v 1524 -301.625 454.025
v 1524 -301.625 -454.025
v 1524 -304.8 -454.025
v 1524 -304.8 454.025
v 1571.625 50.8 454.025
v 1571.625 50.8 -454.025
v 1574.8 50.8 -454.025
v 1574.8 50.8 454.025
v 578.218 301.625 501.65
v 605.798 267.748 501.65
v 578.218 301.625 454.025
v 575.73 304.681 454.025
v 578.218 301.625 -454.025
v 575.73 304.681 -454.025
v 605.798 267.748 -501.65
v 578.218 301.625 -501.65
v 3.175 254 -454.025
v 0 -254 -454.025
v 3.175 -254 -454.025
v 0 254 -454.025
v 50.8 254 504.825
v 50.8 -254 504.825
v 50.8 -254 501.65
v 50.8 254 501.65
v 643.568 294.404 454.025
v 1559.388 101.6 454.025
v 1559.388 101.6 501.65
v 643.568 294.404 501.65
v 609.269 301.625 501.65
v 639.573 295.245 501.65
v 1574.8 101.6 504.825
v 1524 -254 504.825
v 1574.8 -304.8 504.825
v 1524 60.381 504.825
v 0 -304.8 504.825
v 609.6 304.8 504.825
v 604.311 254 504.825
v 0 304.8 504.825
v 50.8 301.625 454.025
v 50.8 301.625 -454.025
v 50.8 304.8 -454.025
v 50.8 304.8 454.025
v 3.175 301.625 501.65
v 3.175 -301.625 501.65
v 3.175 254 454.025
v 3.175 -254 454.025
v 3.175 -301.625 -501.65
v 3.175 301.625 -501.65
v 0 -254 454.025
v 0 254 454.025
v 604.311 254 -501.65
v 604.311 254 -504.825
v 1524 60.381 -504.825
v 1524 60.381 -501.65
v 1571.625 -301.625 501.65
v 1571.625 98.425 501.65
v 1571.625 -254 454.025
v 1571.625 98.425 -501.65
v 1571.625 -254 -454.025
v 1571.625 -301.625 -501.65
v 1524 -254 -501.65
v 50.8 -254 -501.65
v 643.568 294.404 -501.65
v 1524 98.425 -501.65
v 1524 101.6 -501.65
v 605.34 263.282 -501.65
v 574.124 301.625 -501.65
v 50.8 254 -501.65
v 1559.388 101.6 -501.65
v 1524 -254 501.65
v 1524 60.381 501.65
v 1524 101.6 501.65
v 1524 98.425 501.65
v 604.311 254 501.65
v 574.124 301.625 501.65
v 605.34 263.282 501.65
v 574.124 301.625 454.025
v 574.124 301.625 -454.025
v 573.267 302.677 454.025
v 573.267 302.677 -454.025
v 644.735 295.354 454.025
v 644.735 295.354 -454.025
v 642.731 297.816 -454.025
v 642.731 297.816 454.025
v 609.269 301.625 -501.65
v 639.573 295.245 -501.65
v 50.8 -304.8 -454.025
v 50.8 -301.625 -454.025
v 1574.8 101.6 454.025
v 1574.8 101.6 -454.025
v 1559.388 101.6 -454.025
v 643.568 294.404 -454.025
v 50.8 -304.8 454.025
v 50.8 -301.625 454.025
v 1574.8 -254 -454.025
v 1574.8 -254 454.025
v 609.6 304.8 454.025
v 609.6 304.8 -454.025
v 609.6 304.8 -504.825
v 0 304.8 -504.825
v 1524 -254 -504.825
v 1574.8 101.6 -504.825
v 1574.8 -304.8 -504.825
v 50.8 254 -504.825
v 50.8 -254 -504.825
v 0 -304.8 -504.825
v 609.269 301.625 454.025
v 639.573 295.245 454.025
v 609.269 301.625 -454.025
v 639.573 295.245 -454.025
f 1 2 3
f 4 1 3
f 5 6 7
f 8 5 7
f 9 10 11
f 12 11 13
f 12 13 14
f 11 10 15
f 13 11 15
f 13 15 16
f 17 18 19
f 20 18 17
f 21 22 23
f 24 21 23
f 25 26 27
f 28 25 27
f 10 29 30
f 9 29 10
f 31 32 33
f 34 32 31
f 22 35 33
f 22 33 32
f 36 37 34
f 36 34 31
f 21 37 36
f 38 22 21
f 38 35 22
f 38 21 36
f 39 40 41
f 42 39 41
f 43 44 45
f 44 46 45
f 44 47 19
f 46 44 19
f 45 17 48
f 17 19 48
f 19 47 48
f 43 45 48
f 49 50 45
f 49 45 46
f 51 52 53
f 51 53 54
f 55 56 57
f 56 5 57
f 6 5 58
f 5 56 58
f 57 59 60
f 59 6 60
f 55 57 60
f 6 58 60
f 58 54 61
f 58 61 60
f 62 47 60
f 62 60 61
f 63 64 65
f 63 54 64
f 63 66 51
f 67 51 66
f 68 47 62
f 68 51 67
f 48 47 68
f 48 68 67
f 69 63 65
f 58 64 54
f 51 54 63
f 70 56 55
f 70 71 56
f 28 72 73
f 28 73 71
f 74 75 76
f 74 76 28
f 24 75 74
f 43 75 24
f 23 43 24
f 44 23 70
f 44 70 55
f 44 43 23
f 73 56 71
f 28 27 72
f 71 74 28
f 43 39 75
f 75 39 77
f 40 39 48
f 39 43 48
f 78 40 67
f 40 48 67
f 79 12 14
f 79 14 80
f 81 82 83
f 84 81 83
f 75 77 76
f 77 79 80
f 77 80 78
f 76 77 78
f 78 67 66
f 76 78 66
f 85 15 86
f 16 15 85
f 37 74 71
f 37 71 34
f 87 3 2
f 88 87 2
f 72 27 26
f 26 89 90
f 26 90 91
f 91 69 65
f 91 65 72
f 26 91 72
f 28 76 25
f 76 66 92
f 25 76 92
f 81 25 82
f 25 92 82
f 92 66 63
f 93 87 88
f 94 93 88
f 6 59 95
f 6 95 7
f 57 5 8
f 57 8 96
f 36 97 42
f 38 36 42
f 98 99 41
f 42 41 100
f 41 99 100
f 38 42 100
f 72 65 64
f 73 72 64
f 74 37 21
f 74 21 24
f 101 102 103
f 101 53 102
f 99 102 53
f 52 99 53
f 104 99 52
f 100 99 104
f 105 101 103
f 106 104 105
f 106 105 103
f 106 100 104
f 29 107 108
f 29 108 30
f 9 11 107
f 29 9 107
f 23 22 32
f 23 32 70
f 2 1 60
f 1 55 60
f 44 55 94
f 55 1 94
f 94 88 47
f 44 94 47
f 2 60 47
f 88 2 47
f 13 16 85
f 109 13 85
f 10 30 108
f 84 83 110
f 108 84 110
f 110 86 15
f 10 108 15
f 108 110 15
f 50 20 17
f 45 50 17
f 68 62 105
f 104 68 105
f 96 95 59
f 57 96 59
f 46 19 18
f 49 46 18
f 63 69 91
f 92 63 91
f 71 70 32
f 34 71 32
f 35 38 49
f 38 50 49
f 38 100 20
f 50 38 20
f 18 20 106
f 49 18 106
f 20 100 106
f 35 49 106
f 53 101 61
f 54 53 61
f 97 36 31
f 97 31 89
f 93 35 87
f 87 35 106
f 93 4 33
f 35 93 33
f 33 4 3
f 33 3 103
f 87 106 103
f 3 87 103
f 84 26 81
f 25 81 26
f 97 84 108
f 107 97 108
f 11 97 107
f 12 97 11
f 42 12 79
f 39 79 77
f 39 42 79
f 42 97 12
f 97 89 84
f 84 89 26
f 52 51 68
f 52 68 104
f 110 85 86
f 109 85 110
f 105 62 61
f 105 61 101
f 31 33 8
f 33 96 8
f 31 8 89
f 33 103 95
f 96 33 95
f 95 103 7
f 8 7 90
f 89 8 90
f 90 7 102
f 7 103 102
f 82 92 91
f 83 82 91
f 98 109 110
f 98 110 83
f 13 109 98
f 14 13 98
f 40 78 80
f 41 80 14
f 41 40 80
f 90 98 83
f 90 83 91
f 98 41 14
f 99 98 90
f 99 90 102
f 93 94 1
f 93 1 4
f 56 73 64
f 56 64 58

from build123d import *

# Parameters (mm, degrees)
BOTTOM_HORIZONTAL_ANGLE_DEPTH   = 1574.8
BOTTOM_HORIZONTAL_ANGLE_2_DEPTH = 1574.8
FRONT_VERTIAL_ANGLE_DEPTH       = 406.4
REAR_VERTICAL_ANGLE_DEPTH       = 609.6
REAR_TOP_HORIZONTAL_ANGLE_DEPTH = 609.6
BOSS_EXTRUDE5_DEPTH             = 986.357582
BOSS_EXTRUDE6_REACH             = 1011.65


with BuildPart() as part:
    # Sketch5 → Bottom Horizontal Angle (new body)
    with BuildSketch(Plane(origin=(0, 0, 0), x_dir=(0, 0, -1), z_dir=(1, 0, 0))):
        Polygon((-504.825, -304.8), (-504.825, -254), (-501.65, -254), (-501.65, -301.625), (-454.025, -301.625), (-454.025, -304.8), align=None)
    extrude(amount=BOTTOM_HORIZONTAL_ANGLE_DEPTH)



with BuildPart() as body_2:
    # Sketch5 → Bottom Horizontal Angle 2 (new body)
    with BuildSketch(Plane(origin=(0, 0, 0), x_dir=(0, 0, -1), z_dir=(1, 0, 0))):
        Polygon((501.65, -254), (504.825, -254), (504.825, -304.8), (454.025, -304.8), (454.025, -301.625), (501.65, -301.625), align=None)
    extrude(amount=BOTTOM_HORIZONTAL_ANGLE_2_DEPTH)


with BuildPart() as part_1:
    add(part.part)

    add(body_2.part)  # Front Vertial Angle merges body 2
    # Sketch6 → Front Vertial Angle (add)
    with BuildSketch(Plane.XZ.offset(304.8)):
        Polygon((1574.8, -504.825), (1524, -504.825), (1524, -501.65), (1571.625, -501.65), (1571.625, -454.025), (1574.8, -454.025), align=None)
        Polygon((1524, 501.65), (1524, 504.825), (1574.8, 504.825), (1574.8, 454.025), (1571.625, 454.025), (1571.625, 501.65), align=None)
    extrude(amount=-FRONT_VERTIAL_ANGLE_DEPTH)

    # Sketch7 → Rear Vertical Angle (add)
    with BuildSketch(Plane.XZ.offset(304.8)):
        Polygon((0, 504.825), (50.8, 504.825), (50.8, 501.65), (3.175, 501.65), (3.175, 454.025), (0, 454.025), align=None)
        Polygon((50.8, -501.65), (50.8, -504.825), (0, -504.825), (0, -454.025), (3.175, -454.025), (3.175, -501.65), align=None)
    extrude(amount=-REAR_VERTICAL_ANGLE_DEPTH)

    # Sketch8 → Rear Top Horizontal Angle (add)
    with BuildSketch(Plane.ZY):
        Polygon((504.825, 304.8), (504.825, 254), (501.65, 254), (501.65, 301.625), (454.025, 301.625), (454.025, 304.8), align=None)
        Polygon((-501.65, 254), (-504.825, 254), (-504.825, 304.8), (-454.025, 304.8), (-454.025, 301.625), (-501.65, 301.625), align=None)
    extrude(amount=-REAR_TOP_HORIZONTAL_ANGLE_DEPTH)

    # Sketch10 → Boss-Extrude5 (add)
    with BuildSketch(Plane(origin=(522.283289125, -109.954376658, 0), x_dir=(0, 0, -1), z_dir=(0.978549785, -0.206010481, 0))):
        Polygon((504.825, 423.845963712), (504.825, 373.045963712), (501.65, 373.045963712), (501.65, 420.670963712), (454.025, 420.670963712), (454.025, 423.845963712), align=None)
        Polygon((-501.65, 373.045963712), (-504.825, 373.045963712), (-504.825, 423.845963712), (-454.025, 423.845963712), (-454.025, 420.670963712), (-501.65, 420.670963712), align=None)
    extrude(amount=BOSS_EXTRUDE5_DEPTH)

    # Sketch11 → Boss-Extrude6 (add, up to next)
    with BuildSketch(Plane(origin=(0, 0, -504.825), x_dir=(-1, 0, 0), z_dir=(0, 0, -1)), mode=Mode.PRIVATE) as boss_extrude6_sk1:
        Polygon((-1574.8, 101.6), (-1524, 101.6), (-1524, 98.425), (-1571.625, 98.425), (-1571.625, 50.8), (-1574.8, 50.8), align=None)
    boss_extrude6_tool1 = extrude(boss_extrude6_sk1.sketch, amount=-BOSS_EXTRUDE6_REACH, mode=Mode.PRIVATE) - part_1.part
    add(boss_extrude6_tool1.solids().sort_by_distance((1549.4, 100.88158, -504.825))[0])
    # Sketch11 → Boss-Extrude6 (add, up to next)
    with BuildSketch(Plane(origin=(0, 0, -504.825), x_dir=(-1, 0, 0), z_dir=(0, 0, -1)), mode=Mode.PRIVATE) as boss_extrude6_sk2:
        Polygon((-1524, -301.625), (-1524, -304.8), (-1574.8, -304.8), (-1574.8, -254), (-1571.625, -254), (-1571.625, -301.625), align=None)
    boss_extrude6_tool2 = extrude(boss_extrude6_sk2.sketch, amount=-BOSS_EXTRUDE6_REACH, mode=Mode.PRIVATE) - part_1.part
    add(boss_extrude6_tool2.solids().sort_by_distance((1524.71842, -303.2125, -504.825))[0])
    # Sketch11 → Boss-Extrude6 (add, up to next)
    with BuildSketch(Plane(origin=(0, 0, -504.825), x_dir=(-1, 0, 0), z_dir=(0, 0, -1)), mode=Mode.PRIVATE) as boss_extrude6_sk3:
        Polygon((0, -304.8), (-50.8, -304.8), (-50.8, -301.625), (-3.175, -301.625), (-3.175, -254), (0, -254), align=None)
    boss_extrude6_tool3 = extrude(boss_extrude6_sk3.sketch, amount=-BOSS_EXTRUDE6_REACH, mode=Mode.PRIVATE) - part_1.part
    add(boss_extrude6_tool3.solids().sort_by_distance((25.4, -304.08158, -504.825))[0])
    # Sketch11 → Boss-Extrude6 (add, up to next)
    with BuildSketch(Plane(origin=(0, 0, -504.825), x_dir=(-1, 0, 0), z_dir=(0, 0, -1)), mode=Mode.PRIVATE) as boss_extrude6_sk4:
        Polygon((-3.175, 301.625), (-50.8, 301.625), (-50.8, 304.8), (0, 304.8), (0, 254), (-3.175, 254), align=None)
    boss_extrude6_tool4 = extrude(boss_extrude6_sk4.sketch, amount=-BOSS_EXTRUDE6_REACH, mode=Mode.PRIVATE) - part_1.part
    add(boss_extrude6_tool4.solids().sort_by_distance((26.9875, 302.34342, -504.825))[0])
    # Sketch11 → Boss-Extrude6 (add, up to next)
    with BuildSketch(Plane(origin=(0, 0, -504.825), x_dir=(-1, 0, 0), z_dir=(0, 0, -1)), mode=Mode.PRIVATE) as boss_extrude6_sk5:
        Polygon((-605.340190101, 263.281530829), (-644.735373854, 295.354252838), (-642.730828729, 297.816451822), (-605.79784396, 267.748274939), (-575.729667077, 304.681259707), (-573.267468092, 302.676714582), align=None)
    boss_extrude6_tool5 = extrude(boss_extrude6_sk5.sketch, amount=-BOSS_EXTRUDE6_REACH, mode=Mode.PRIVATE) - part_1.part
    add(boss_extrude6_tool5.solids().sort_by_distance((624.516329, 279.958397, -504.825))[0])


solid = part_1.part
